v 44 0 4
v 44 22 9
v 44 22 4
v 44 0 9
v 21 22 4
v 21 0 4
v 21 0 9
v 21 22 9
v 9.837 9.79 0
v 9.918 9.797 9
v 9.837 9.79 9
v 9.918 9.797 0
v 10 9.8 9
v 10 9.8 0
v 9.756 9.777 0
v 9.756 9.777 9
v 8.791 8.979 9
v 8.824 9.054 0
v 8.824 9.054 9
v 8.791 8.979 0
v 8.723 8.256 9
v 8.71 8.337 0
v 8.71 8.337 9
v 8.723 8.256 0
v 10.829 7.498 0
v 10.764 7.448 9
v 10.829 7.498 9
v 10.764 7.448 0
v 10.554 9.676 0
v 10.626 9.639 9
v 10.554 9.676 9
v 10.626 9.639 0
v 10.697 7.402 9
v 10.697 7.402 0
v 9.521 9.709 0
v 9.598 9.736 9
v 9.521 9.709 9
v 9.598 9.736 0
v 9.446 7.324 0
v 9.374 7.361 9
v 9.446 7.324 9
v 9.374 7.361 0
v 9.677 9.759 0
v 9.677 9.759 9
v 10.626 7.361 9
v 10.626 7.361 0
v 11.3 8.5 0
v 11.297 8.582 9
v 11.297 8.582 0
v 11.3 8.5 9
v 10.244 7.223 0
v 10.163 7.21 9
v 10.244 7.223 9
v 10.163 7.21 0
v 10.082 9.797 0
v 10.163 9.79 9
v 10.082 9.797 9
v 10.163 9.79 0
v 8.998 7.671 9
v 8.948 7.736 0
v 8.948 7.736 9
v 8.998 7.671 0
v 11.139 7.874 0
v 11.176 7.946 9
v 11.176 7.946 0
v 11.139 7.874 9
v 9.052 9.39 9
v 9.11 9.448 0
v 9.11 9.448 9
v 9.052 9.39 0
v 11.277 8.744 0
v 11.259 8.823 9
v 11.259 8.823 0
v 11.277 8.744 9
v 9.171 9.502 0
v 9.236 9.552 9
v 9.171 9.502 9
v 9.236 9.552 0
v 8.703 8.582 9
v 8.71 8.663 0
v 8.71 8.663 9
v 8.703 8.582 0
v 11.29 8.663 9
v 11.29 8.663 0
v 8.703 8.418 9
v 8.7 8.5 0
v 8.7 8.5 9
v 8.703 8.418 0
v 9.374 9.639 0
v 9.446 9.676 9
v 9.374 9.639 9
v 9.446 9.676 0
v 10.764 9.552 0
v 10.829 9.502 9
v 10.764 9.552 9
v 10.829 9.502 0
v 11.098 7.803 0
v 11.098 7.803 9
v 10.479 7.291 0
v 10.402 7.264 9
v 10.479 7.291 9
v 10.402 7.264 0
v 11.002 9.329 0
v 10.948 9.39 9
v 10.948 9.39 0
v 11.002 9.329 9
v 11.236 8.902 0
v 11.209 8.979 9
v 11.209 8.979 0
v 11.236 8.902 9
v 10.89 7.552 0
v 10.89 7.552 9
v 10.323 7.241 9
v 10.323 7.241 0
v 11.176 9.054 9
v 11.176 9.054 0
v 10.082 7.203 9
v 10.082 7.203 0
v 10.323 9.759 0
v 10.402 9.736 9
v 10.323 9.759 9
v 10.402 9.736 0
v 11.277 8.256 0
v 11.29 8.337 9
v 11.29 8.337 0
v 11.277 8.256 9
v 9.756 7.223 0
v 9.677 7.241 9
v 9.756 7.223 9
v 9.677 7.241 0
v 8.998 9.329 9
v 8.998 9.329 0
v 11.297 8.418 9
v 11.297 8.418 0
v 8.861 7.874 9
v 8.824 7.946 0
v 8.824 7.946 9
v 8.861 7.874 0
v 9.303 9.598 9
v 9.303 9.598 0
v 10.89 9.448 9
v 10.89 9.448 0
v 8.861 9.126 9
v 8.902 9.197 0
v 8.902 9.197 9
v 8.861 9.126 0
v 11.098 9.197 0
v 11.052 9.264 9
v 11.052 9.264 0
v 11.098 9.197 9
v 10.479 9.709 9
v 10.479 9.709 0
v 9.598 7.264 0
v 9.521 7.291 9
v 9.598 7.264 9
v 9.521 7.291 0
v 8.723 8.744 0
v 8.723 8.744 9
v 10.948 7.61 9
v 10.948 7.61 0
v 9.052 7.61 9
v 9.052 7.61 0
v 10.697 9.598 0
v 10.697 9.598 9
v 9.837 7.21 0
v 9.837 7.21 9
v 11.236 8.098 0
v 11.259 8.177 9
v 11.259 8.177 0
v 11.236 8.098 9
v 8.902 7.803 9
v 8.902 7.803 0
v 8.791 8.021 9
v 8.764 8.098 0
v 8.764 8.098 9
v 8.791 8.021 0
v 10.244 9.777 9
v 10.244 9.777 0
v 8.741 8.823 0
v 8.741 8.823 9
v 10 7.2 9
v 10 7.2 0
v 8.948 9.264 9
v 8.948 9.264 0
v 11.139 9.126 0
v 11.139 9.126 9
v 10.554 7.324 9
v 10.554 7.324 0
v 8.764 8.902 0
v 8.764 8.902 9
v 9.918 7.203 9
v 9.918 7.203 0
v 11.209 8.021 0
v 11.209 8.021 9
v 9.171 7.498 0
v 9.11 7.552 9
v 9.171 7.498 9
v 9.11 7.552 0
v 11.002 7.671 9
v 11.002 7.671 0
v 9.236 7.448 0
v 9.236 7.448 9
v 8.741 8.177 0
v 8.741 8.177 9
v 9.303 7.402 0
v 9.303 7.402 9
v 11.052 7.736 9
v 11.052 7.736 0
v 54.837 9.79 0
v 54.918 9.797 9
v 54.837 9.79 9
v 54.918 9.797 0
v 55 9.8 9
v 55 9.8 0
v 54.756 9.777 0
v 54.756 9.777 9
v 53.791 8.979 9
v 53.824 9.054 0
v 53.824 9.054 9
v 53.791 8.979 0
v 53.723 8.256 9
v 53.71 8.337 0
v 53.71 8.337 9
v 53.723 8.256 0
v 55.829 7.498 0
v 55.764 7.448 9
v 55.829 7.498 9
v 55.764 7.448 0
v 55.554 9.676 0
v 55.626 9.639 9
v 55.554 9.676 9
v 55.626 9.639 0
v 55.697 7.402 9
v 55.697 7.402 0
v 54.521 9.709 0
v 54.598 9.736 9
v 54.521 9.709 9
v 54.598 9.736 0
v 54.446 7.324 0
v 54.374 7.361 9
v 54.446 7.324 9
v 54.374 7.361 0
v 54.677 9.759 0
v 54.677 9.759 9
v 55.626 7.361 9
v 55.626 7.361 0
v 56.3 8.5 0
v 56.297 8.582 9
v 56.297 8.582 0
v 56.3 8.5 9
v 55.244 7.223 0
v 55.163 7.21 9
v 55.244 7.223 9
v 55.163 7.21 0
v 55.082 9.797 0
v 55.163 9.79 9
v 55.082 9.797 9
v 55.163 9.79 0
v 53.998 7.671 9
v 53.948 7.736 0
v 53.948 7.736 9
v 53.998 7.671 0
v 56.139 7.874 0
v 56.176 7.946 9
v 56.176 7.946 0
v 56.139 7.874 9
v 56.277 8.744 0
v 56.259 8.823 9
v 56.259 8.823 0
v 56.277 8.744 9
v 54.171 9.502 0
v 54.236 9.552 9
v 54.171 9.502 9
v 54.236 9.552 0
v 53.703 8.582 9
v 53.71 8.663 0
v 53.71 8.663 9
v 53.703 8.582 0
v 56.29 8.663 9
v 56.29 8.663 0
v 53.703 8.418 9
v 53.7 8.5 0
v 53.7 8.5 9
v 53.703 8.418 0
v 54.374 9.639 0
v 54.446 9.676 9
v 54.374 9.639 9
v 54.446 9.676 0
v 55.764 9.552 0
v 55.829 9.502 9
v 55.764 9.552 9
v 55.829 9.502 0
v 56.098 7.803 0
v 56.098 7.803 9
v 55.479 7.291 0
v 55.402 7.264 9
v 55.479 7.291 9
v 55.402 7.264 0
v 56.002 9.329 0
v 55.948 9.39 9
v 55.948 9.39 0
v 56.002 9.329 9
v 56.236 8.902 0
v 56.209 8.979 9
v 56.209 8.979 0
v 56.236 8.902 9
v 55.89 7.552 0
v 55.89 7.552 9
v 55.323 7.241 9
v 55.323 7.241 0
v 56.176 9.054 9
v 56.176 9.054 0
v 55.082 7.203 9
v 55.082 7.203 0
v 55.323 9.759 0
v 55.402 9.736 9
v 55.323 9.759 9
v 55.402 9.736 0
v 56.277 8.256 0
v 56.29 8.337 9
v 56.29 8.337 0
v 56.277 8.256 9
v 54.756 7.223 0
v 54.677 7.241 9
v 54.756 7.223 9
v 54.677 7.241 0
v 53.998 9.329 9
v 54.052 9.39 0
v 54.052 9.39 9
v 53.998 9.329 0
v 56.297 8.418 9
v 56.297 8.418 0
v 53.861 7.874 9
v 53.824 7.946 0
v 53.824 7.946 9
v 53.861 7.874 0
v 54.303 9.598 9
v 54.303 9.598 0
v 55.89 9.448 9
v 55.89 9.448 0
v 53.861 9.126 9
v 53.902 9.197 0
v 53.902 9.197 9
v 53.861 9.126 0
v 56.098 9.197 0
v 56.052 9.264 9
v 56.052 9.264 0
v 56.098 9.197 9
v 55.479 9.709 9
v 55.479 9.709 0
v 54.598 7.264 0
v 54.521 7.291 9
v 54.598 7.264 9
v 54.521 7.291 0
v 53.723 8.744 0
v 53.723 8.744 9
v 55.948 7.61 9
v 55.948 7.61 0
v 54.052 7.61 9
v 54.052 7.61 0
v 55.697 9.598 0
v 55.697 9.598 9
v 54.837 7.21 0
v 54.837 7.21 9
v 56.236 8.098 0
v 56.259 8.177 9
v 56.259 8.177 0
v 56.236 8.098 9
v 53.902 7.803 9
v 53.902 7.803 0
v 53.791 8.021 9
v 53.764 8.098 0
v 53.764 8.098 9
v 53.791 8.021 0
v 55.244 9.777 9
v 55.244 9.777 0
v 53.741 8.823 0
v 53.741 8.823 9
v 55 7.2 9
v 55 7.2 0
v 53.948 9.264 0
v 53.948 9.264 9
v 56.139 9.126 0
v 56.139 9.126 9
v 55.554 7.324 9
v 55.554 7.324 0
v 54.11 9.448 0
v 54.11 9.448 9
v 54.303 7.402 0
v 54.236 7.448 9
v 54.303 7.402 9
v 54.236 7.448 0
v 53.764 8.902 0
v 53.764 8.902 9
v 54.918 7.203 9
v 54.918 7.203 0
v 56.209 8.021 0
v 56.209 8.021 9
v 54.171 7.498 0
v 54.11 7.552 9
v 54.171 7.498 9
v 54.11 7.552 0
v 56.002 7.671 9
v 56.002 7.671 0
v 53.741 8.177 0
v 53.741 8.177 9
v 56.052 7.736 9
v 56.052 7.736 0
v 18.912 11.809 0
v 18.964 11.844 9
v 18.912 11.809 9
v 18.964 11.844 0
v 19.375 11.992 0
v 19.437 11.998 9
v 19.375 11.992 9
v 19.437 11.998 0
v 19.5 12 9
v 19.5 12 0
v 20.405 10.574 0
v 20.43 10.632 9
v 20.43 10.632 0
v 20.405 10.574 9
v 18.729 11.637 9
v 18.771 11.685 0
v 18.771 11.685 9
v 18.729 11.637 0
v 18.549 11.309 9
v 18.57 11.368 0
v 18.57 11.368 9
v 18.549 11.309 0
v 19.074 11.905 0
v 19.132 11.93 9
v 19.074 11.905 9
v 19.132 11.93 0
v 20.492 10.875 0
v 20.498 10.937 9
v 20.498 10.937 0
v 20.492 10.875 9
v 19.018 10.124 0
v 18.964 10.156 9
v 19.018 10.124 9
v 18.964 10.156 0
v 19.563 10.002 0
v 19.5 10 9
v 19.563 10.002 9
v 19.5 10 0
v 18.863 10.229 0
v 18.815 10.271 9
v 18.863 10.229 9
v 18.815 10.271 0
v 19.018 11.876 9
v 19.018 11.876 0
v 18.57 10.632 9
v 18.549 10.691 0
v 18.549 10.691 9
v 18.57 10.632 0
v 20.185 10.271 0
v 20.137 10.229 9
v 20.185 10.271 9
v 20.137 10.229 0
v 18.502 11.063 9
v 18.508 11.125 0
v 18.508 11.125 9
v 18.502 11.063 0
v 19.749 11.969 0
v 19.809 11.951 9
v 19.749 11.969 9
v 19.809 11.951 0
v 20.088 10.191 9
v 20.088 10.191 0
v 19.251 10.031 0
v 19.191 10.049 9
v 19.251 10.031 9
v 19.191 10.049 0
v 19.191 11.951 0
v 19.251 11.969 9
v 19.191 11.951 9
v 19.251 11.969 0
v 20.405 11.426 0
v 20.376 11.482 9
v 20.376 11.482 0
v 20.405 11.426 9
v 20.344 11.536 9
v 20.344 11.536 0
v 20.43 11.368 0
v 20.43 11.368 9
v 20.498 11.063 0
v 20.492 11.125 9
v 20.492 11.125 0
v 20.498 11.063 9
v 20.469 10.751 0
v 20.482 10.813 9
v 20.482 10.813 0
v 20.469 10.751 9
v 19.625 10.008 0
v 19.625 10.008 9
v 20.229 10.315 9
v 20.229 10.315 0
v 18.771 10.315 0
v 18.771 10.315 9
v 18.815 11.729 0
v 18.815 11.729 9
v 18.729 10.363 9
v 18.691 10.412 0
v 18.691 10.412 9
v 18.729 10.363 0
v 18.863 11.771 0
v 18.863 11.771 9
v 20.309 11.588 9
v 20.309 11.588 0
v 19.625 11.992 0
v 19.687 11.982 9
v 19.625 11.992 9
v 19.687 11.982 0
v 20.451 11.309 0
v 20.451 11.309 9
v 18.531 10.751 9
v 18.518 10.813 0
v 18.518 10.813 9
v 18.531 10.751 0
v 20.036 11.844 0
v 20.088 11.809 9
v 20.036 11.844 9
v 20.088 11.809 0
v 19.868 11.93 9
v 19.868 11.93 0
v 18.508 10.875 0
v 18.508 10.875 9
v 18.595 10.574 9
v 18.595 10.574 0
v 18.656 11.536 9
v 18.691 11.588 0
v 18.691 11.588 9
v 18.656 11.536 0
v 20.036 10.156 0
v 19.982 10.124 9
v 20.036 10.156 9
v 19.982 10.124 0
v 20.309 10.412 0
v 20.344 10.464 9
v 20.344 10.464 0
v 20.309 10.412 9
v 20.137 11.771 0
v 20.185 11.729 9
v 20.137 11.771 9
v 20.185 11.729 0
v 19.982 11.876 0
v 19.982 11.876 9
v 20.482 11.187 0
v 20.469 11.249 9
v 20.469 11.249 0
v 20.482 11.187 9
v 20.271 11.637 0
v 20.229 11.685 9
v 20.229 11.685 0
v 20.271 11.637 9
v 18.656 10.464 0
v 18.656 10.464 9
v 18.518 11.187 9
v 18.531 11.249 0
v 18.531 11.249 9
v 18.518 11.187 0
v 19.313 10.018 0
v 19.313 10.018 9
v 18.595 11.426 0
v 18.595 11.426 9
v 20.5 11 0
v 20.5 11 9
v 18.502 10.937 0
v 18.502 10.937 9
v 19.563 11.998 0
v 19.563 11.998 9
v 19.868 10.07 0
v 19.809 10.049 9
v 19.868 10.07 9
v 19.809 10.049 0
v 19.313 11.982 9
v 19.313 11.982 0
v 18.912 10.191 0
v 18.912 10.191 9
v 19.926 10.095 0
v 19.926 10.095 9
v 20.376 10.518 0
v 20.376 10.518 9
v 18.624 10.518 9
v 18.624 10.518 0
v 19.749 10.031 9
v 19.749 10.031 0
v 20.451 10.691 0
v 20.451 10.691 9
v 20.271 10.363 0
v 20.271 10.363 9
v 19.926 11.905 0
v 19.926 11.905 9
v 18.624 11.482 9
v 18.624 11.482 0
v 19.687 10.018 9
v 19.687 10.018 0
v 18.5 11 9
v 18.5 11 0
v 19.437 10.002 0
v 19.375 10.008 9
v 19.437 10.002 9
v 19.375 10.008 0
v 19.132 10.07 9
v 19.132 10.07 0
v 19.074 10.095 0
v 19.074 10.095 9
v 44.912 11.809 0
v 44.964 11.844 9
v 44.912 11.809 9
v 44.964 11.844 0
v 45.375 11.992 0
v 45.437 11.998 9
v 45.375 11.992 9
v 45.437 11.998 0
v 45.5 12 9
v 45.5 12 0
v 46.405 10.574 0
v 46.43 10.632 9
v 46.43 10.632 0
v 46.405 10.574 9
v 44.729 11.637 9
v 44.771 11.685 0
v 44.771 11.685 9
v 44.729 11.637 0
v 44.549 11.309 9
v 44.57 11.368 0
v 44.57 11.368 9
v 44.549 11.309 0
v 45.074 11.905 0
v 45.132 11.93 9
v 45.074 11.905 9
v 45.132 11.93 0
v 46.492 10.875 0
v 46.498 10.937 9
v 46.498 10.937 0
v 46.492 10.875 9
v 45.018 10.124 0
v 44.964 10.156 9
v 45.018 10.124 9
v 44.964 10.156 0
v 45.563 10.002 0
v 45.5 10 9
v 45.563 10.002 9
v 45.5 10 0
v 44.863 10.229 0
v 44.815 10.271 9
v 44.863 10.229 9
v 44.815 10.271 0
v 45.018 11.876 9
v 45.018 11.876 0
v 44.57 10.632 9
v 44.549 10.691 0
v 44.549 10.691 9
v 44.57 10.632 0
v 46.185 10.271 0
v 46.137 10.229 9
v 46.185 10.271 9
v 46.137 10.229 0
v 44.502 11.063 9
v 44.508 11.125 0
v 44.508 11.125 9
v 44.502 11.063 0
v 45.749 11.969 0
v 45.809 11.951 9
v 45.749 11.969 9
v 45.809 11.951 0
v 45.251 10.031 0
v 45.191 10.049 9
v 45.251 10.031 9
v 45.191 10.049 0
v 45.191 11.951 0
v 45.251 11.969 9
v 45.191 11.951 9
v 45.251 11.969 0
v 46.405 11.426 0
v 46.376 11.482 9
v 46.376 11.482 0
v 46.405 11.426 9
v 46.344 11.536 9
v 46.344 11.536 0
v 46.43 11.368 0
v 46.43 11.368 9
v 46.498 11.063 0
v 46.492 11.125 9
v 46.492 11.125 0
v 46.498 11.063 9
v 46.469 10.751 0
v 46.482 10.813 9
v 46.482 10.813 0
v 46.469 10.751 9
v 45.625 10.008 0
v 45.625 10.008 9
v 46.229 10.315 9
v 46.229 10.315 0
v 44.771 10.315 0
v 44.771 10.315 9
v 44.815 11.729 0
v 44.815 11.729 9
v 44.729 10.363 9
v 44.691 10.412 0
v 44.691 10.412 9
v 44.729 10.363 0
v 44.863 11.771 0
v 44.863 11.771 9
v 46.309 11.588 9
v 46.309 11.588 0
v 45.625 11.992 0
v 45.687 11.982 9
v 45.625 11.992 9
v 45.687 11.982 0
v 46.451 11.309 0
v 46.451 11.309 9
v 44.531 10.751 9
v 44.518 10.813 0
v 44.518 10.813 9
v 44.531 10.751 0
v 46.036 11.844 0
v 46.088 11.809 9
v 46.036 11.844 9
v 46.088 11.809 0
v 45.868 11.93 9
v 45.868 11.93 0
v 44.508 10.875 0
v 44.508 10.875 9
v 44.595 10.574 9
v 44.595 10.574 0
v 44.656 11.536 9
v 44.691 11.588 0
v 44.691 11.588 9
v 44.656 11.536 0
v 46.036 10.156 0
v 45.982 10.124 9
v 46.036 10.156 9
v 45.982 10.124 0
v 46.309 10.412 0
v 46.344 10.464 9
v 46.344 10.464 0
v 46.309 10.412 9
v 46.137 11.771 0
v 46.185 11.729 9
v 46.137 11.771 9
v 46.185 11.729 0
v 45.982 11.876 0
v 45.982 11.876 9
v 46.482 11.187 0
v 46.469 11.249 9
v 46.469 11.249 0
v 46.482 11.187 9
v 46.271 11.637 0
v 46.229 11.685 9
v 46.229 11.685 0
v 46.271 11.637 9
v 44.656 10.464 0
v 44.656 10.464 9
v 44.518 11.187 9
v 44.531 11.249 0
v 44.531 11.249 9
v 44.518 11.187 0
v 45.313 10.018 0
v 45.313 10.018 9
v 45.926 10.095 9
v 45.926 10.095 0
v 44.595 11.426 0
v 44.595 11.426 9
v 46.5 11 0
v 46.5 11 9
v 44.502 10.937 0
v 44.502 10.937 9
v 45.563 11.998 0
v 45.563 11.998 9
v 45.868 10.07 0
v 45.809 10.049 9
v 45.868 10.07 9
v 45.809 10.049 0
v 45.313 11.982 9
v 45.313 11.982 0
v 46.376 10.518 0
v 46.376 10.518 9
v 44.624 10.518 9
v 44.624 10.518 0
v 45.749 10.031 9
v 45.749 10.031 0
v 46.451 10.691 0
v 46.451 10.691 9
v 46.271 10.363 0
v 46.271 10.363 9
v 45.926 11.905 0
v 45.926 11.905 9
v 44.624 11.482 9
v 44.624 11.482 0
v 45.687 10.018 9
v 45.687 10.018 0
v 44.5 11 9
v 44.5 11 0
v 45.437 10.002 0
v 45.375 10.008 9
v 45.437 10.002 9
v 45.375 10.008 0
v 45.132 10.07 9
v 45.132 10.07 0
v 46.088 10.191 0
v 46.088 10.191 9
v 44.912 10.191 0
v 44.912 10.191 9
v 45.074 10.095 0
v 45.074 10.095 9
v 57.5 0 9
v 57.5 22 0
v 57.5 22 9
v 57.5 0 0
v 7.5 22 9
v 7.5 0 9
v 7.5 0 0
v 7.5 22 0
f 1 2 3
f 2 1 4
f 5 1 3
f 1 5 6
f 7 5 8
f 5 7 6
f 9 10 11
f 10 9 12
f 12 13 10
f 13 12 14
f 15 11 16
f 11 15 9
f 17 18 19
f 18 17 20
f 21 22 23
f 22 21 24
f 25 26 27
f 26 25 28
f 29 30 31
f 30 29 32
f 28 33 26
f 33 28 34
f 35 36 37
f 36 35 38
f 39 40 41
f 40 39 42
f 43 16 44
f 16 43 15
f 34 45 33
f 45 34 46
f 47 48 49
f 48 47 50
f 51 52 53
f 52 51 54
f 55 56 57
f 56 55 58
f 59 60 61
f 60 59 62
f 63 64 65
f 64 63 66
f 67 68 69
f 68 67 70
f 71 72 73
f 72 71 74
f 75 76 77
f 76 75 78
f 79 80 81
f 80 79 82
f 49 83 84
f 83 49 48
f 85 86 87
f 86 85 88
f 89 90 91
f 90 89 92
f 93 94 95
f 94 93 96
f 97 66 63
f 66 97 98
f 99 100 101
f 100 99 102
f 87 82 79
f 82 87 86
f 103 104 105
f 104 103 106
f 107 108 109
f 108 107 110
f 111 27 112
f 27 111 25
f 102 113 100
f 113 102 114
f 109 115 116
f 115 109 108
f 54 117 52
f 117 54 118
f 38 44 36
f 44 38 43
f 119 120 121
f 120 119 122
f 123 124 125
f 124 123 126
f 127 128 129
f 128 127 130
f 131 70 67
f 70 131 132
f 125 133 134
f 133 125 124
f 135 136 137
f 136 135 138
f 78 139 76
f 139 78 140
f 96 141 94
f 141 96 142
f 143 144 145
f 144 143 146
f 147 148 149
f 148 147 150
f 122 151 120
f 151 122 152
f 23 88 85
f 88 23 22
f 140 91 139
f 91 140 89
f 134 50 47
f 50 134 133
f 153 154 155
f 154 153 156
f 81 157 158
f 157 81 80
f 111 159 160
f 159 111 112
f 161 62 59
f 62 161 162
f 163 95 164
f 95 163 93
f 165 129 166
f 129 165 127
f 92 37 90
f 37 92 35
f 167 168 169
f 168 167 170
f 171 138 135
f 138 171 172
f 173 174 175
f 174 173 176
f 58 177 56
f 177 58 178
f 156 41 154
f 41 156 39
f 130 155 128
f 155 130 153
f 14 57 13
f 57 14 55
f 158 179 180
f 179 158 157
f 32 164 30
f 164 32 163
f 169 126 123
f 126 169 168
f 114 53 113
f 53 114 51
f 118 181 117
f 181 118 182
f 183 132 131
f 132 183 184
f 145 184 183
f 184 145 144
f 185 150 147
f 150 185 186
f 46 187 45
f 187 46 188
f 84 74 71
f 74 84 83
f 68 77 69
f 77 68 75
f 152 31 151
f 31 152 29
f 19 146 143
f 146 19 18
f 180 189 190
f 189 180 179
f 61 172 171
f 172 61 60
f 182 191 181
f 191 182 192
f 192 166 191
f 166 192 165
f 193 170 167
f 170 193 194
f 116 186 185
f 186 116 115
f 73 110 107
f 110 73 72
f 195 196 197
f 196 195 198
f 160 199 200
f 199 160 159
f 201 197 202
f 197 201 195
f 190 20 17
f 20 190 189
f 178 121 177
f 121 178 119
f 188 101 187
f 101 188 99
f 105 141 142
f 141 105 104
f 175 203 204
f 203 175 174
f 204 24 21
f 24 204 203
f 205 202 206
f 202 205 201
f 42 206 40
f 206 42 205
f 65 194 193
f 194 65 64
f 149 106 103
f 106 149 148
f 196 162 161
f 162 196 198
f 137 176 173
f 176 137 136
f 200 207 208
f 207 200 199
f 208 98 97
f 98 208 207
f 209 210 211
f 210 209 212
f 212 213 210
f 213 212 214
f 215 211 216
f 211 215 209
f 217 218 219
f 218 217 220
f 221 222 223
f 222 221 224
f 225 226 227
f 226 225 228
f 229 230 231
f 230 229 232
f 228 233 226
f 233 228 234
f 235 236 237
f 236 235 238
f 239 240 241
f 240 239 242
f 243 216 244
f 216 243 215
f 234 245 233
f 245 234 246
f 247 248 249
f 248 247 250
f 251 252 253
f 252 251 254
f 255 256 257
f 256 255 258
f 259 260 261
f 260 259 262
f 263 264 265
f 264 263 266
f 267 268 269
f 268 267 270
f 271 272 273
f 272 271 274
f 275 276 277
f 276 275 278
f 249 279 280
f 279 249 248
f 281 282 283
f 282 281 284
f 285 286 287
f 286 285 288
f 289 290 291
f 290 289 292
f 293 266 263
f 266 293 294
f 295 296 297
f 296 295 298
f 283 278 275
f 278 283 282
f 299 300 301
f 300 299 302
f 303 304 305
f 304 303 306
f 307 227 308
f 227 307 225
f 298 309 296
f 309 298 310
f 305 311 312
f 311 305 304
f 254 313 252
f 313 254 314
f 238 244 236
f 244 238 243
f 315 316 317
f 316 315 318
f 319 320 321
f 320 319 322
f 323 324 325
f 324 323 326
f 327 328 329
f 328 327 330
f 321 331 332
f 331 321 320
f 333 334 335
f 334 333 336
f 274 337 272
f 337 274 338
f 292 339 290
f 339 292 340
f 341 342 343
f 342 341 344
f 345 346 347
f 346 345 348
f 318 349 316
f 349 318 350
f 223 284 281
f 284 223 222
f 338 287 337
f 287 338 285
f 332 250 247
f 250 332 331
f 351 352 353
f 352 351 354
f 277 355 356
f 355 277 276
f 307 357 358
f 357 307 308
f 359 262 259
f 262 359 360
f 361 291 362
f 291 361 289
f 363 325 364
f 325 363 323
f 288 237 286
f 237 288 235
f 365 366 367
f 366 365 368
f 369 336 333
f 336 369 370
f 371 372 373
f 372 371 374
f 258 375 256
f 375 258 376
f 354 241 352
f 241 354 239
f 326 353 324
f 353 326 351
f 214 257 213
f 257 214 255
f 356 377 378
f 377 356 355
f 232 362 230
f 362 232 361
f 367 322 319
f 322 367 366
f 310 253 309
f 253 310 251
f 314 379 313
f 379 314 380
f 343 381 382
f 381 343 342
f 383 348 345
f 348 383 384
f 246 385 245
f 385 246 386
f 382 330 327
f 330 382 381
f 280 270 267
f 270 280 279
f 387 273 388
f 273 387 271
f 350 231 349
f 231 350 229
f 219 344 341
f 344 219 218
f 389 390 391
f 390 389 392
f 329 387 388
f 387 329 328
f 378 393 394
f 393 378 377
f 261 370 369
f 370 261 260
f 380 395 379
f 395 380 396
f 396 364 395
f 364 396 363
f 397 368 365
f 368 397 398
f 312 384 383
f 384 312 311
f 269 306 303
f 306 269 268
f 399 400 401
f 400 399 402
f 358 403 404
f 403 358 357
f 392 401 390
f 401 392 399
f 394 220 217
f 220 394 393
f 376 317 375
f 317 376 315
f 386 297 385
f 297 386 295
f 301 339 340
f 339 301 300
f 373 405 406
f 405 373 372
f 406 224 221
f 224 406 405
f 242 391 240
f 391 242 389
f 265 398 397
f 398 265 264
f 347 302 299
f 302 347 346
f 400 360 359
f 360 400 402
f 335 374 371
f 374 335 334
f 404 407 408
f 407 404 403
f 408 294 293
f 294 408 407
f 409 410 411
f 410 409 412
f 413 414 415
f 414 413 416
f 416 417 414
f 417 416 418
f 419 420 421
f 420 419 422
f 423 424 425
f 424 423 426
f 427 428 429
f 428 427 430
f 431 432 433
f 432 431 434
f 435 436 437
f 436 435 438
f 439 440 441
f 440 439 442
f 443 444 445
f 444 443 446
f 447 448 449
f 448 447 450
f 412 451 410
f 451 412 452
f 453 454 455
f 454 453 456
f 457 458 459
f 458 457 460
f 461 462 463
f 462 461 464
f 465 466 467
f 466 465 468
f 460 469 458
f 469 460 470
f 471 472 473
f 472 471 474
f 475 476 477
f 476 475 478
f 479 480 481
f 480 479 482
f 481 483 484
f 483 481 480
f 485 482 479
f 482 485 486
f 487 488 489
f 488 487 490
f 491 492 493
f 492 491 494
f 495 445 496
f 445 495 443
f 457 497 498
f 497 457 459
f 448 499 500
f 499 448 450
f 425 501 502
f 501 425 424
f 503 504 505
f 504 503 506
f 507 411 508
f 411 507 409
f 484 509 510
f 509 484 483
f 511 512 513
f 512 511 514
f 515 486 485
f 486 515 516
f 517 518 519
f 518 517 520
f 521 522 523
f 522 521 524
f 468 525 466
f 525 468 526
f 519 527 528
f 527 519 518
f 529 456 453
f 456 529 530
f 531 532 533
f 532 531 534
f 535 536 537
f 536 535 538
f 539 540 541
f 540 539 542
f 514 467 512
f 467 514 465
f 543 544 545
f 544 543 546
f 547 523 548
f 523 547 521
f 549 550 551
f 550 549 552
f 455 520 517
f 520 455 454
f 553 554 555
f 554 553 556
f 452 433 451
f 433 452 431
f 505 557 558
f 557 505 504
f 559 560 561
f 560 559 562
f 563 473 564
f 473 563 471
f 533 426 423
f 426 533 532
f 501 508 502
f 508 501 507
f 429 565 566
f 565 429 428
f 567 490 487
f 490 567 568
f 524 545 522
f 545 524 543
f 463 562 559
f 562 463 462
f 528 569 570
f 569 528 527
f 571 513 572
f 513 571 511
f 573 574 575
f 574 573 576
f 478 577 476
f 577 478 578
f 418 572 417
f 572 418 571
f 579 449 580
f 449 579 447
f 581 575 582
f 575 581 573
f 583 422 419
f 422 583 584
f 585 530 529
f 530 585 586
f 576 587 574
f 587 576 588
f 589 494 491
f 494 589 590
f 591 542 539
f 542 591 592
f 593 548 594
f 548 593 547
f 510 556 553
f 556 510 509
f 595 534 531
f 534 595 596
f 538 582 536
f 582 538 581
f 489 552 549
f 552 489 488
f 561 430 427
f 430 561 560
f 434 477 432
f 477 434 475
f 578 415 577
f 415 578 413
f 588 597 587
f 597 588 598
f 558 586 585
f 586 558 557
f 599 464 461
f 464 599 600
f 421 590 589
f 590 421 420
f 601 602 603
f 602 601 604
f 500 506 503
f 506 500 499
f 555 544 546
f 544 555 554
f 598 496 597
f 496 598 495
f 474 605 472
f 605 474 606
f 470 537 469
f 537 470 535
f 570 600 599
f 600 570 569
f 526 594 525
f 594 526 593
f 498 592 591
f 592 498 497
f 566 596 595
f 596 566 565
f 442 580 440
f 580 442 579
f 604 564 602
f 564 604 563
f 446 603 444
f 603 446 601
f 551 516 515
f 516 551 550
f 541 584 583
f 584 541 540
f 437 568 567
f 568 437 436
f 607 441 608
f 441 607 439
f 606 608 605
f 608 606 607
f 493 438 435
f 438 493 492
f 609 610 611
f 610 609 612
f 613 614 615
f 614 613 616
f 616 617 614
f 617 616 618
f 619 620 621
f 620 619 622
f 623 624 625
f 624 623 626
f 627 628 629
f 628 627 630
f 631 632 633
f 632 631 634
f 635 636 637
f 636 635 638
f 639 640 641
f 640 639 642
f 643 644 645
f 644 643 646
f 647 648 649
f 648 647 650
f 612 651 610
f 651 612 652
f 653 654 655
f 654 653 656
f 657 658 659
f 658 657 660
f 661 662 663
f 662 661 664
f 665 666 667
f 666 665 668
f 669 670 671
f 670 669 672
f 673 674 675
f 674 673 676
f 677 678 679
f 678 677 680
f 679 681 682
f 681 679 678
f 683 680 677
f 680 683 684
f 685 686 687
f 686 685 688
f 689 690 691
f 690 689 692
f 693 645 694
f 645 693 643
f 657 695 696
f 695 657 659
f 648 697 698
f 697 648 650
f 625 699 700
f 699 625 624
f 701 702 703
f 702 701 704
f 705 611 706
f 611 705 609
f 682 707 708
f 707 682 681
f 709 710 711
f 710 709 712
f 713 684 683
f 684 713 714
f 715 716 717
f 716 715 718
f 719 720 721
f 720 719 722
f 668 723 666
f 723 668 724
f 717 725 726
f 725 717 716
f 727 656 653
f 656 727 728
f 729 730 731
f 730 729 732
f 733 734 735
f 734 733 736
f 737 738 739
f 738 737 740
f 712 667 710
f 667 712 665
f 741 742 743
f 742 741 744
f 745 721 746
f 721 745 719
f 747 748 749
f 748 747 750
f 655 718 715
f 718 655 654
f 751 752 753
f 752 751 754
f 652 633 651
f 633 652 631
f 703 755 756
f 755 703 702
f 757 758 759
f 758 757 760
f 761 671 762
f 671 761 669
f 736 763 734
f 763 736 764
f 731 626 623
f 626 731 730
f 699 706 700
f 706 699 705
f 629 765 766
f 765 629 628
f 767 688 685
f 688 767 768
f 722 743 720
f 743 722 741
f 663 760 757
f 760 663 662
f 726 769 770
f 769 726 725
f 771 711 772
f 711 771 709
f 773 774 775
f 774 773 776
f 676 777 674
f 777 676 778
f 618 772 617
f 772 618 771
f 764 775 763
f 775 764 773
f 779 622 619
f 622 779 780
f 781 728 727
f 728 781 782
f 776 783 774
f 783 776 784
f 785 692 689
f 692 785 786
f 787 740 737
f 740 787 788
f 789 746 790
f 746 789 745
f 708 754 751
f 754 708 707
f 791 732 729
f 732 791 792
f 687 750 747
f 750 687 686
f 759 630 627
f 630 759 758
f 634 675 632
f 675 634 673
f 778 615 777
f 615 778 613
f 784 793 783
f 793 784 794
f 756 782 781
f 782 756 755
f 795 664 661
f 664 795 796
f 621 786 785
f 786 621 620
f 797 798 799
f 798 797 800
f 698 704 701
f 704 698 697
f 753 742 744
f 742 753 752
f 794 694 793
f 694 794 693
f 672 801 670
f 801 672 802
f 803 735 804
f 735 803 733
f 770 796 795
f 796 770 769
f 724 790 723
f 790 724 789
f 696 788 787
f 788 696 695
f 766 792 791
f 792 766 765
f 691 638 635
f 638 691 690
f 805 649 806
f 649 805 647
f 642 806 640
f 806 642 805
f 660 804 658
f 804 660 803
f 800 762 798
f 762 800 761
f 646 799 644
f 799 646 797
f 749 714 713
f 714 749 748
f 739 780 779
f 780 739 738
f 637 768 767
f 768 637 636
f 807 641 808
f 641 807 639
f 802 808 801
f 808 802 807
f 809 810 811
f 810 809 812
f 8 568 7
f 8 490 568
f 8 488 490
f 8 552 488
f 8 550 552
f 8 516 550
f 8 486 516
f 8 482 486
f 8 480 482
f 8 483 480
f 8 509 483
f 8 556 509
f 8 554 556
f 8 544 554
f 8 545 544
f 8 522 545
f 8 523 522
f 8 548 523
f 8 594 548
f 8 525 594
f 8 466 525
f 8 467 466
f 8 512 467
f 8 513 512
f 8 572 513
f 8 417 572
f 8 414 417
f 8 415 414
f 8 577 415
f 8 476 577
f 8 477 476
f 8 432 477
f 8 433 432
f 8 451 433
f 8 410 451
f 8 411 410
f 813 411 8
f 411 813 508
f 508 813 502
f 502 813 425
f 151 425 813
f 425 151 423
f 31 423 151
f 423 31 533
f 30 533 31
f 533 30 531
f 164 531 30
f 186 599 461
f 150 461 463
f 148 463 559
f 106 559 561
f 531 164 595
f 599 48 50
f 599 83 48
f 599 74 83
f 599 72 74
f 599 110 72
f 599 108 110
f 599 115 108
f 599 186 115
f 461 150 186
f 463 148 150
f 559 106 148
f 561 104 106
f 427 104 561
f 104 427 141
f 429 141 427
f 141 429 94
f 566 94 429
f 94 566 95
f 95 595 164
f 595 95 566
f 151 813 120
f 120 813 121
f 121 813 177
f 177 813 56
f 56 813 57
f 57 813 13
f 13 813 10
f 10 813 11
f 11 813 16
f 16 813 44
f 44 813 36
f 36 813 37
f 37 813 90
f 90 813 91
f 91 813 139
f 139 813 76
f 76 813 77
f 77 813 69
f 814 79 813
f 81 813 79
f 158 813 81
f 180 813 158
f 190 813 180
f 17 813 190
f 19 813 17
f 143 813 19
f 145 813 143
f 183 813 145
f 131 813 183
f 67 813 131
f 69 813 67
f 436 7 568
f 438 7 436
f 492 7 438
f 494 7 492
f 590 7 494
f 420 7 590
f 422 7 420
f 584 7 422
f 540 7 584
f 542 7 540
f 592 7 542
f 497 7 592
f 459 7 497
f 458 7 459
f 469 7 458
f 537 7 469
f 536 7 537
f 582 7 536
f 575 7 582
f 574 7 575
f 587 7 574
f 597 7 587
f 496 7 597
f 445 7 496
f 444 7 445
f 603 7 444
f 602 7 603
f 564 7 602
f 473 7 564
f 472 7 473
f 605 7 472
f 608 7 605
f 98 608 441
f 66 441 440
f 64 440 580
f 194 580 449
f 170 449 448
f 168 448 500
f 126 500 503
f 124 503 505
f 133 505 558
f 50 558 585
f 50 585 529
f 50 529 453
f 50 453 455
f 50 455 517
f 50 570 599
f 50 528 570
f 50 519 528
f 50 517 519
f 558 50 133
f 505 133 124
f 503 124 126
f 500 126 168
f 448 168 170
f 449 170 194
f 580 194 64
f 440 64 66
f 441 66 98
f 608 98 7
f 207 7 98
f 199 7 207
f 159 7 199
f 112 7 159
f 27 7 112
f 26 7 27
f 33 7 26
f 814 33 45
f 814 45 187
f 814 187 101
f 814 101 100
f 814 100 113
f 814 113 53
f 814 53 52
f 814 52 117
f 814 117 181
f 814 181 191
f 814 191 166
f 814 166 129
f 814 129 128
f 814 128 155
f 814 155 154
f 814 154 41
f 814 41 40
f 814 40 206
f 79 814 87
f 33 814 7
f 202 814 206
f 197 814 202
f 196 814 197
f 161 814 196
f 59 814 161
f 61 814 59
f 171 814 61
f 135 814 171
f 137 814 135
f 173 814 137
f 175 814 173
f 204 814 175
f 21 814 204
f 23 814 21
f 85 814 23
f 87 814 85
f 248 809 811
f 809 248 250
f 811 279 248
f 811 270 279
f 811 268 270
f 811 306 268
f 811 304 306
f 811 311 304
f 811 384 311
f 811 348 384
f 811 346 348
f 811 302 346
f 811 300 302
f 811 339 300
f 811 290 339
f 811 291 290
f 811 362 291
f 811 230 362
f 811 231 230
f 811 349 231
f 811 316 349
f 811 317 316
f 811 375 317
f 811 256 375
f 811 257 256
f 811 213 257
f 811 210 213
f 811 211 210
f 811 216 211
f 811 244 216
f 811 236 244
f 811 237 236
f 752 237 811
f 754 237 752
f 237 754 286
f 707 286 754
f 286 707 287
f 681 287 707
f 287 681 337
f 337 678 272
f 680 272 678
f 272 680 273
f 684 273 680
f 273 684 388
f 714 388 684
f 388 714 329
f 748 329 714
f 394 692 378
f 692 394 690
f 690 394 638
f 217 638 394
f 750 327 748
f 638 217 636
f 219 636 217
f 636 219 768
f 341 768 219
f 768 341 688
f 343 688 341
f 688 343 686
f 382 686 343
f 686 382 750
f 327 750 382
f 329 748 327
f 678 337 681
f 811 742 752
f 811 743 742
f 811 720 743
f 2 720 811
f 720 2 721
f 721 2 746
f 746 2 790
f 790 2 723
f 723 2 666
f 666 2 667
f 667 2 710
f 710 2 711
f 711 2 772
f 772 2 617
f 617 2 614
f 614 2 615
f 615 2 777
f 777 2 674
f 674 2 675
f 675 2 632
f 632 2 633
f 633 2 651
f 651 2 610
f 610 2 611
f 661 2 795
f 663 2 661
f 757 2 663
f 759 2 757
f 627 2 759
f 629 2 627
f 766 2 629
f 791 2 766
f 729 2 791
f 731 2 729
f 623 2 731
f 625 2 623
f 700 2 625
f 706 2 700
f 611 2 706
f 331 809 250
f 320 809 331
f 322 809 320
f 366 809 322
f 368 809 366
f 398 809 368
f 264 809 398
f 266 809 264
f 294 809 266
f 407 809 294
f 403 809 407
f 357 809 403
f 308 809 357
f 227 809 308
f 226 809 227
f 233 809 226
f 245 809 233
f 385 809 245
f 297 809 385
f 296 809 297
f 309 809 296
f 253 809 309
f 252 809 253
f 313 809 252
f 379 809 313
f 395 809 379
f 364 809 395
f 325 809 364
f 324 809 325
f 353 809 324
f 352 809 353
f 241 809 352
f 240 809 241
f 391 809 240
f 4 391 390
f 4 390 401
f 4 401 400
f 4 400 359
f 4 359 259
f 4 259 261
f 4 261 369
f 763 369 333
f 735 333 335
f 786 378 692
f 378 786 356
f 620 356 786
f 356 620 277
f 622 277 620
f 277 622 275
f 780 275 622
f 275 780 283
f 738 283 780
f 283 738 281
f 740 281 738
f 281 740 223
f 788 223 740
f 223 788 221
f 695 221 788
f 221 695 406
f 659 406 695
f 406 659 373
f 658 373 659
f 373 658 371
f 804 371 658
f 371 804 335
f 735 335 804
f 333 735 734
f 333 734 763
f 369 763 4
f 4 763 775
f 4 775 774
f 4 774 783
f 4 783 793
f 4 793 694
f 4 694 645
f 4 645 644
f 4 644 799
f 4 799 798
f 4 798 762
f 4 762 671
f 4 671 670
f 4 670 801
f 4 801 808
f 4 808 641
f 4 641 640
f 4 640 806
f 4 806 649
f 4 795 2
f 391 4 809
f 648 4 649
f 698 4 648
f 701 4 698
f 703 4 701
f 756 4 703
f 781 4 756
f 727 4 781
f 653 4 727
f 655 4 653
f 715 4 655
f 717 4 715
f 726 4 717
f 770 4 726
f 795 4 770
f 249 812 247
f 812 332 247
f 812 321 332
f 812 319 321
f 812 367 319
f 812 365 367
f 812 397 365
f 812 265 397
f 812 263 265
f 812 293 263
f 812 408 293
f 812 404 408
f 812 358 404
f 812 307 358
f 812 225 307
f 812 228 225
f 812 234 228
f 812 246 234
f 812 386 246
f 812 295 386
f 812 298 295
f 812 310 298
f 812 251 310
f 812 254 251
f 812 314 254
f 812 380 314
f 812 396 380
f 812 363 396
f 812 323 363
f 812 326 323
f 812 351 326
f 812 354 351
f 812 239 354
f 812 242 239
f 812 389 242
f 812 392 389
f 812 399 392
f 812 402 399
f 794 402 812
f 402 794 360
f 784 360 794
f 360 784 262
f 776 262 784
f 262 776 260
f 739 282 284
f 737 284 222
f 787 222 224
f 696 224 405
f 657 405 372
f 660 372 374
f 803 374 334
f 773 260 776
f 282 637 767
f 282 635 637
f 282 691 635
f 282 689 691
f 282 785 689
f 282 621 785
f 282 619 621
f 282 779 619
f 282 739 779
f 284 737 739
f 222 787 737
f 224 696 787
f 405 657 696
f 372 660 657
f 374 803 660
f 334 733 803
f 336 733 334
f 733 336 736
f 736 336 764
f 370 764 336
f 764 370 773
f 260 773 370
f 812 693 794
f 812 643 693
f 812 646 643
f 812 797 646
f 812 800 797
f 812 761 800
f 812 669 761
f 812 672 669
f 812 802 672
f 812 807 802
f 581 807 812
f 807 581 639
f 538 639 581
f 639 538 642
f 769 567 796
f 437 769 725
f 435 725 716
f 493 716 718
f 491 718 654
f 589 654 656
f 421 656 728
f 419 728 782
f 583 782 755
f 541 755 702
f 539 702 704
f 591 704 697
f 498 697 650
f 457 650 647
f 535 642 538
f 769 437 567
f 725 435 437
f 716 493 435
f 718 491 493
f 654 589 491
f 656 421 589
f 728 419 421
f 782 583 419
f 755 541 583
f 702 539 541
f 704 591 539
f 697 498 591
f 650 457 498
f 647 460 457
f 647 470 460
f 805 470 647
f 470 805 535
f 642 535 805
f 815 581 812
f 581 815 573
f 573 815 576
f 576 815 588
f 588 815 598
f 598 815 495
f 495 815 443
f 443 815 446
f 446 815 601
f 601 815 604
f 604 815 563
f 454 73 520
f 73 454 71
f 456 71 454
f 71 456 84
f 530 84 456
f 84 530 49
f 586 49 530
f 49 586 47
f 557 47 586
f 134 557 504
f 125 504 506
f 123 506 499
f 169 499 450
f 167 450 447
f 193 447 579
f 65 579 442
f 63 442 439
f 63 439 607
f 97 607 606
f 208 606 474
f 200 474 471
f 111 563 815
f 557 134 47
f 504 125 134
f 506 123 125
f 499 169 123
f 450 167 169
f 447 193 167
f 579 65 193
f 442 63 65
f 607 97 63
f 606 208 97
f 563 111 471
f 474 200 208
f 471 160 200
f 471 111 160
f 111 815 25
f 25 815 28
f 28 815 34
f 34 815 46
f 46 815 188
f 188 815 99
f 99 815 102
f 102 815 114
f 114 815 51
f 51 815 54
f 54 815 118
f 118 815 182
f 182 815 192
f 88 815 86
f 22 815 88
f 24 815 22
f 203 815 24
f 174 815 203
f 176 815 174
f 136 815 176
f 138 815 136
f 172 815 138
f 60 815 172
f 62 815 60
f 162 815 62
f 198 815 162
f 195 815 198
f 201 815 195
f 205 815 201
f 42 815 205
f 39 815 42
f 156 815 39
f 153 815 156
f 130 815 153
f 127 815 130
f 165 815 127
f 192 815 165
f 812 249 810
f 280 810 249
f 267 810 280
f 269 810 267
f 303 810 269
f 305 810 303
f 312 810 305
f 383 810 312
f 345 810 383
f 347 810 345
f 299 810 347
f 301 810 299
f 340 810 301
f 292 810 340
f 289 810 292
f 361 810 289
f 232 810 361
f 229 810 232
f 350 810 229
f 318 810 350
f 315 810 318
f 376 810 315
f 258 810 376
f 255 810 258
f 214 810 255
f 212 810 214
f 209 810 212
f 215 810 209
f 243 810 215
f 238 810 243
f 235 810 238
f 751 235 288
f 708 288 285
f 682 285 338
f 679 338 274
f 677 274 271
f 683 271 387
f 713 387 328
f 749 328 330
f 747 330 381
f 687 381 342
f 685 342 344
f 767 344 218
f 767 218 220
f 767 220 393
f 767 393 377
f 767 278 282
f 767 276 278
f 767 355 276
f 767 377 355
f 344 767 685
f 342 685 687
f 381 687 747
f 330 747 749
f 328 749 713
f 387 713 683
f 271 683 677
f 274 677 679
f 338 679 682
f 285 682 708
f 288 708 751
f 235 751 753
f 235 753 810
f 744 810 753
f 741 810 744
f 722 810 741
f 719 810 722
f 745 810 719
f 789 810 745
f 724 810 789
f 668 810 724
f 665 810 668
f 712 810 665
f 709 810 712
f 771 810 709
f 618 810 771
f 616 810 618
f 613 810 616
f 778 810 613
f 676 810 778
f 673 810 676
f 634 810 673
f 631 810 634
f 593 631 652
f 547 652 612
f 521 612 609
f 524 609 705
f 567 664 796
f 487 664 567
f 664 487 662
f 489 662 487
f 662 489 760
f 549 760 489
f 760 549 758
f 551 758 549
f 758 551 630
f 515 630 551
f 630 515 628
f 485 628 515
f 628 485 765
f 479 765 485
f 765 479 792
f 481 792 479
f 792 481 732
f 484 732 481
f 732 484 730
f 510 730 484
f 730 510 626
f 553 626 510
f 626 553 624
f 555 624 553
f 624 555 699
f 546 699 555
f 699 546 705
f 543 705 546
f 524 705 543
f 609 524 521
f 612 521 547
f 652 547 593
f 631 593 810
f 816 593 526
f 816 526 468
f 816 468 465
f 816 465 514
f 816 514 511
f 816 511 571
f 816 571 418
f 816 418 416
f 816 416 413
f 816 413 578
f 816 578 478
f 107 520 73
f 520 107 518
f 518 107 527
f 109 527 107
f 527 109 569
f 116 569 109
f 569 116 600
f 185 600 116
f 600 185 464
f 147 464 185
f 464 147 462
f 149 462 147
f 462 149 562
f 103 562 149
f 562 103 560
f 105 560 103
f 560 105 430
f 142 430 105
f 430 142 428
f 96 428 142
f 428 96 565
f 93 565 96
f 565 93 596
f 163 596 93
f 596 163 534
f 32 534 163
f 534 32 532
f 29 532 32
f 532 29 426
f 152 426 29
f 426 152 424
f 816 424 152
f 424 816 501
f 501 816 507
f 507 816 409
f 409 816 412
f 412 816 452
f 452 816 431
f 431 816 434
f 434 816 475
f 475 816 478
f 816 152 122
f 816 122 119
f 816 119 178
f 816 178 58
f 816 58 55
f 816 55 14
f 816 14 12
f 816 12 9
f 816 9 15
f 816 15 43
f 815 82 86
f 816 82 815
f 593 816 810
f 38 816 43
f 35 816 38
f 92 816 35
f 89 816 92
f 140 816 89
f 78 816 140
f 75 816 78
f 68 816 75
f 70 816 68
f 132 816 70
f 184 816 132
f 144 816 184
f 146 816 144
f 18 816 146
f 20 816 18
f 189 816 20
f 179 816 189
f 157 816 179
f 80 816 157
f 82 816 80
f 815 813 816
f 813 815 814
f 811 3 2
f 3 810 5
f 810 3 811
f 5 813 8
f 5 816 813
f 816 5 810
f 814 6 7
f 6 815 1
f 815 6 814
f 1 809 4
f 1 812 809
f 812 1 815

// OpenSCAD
difference(){
	union(){
        
       translate([7.5,0,0]){
           cube([50,22,9], center=false);
       }




	}
	union() {

       translate([7.5+27/2,-1,4]){
           cube([23,30.1,7], center=false);
       }

 
       translate([7.5+2.5,8.5,-1]){
            rotate(a = [0,0,90]) {
              cylinder(h=600, r=1.3, $fn=100, center=false);
            }
       }	
       translate([7.5+47.5,8.5,-1]){
            rotate(a = [0,0,90]) {
              cylinder(h=600, r=1.3, $fn=100, center=false);
            }
       }	
//
       translate([7.5+25-13,11,-1]){
            rotate(a = [0,0,90]) {
              cylinder(h=600, r=1, $fn=100, center=false);
            }
       }	
       translate([7.5+25+13,11,-1]){
            rotate(a = [0,0,90]) {
              cylinder(h=600, r=1, $fn=100, center=false);
            }
       }	

        
	}
}
